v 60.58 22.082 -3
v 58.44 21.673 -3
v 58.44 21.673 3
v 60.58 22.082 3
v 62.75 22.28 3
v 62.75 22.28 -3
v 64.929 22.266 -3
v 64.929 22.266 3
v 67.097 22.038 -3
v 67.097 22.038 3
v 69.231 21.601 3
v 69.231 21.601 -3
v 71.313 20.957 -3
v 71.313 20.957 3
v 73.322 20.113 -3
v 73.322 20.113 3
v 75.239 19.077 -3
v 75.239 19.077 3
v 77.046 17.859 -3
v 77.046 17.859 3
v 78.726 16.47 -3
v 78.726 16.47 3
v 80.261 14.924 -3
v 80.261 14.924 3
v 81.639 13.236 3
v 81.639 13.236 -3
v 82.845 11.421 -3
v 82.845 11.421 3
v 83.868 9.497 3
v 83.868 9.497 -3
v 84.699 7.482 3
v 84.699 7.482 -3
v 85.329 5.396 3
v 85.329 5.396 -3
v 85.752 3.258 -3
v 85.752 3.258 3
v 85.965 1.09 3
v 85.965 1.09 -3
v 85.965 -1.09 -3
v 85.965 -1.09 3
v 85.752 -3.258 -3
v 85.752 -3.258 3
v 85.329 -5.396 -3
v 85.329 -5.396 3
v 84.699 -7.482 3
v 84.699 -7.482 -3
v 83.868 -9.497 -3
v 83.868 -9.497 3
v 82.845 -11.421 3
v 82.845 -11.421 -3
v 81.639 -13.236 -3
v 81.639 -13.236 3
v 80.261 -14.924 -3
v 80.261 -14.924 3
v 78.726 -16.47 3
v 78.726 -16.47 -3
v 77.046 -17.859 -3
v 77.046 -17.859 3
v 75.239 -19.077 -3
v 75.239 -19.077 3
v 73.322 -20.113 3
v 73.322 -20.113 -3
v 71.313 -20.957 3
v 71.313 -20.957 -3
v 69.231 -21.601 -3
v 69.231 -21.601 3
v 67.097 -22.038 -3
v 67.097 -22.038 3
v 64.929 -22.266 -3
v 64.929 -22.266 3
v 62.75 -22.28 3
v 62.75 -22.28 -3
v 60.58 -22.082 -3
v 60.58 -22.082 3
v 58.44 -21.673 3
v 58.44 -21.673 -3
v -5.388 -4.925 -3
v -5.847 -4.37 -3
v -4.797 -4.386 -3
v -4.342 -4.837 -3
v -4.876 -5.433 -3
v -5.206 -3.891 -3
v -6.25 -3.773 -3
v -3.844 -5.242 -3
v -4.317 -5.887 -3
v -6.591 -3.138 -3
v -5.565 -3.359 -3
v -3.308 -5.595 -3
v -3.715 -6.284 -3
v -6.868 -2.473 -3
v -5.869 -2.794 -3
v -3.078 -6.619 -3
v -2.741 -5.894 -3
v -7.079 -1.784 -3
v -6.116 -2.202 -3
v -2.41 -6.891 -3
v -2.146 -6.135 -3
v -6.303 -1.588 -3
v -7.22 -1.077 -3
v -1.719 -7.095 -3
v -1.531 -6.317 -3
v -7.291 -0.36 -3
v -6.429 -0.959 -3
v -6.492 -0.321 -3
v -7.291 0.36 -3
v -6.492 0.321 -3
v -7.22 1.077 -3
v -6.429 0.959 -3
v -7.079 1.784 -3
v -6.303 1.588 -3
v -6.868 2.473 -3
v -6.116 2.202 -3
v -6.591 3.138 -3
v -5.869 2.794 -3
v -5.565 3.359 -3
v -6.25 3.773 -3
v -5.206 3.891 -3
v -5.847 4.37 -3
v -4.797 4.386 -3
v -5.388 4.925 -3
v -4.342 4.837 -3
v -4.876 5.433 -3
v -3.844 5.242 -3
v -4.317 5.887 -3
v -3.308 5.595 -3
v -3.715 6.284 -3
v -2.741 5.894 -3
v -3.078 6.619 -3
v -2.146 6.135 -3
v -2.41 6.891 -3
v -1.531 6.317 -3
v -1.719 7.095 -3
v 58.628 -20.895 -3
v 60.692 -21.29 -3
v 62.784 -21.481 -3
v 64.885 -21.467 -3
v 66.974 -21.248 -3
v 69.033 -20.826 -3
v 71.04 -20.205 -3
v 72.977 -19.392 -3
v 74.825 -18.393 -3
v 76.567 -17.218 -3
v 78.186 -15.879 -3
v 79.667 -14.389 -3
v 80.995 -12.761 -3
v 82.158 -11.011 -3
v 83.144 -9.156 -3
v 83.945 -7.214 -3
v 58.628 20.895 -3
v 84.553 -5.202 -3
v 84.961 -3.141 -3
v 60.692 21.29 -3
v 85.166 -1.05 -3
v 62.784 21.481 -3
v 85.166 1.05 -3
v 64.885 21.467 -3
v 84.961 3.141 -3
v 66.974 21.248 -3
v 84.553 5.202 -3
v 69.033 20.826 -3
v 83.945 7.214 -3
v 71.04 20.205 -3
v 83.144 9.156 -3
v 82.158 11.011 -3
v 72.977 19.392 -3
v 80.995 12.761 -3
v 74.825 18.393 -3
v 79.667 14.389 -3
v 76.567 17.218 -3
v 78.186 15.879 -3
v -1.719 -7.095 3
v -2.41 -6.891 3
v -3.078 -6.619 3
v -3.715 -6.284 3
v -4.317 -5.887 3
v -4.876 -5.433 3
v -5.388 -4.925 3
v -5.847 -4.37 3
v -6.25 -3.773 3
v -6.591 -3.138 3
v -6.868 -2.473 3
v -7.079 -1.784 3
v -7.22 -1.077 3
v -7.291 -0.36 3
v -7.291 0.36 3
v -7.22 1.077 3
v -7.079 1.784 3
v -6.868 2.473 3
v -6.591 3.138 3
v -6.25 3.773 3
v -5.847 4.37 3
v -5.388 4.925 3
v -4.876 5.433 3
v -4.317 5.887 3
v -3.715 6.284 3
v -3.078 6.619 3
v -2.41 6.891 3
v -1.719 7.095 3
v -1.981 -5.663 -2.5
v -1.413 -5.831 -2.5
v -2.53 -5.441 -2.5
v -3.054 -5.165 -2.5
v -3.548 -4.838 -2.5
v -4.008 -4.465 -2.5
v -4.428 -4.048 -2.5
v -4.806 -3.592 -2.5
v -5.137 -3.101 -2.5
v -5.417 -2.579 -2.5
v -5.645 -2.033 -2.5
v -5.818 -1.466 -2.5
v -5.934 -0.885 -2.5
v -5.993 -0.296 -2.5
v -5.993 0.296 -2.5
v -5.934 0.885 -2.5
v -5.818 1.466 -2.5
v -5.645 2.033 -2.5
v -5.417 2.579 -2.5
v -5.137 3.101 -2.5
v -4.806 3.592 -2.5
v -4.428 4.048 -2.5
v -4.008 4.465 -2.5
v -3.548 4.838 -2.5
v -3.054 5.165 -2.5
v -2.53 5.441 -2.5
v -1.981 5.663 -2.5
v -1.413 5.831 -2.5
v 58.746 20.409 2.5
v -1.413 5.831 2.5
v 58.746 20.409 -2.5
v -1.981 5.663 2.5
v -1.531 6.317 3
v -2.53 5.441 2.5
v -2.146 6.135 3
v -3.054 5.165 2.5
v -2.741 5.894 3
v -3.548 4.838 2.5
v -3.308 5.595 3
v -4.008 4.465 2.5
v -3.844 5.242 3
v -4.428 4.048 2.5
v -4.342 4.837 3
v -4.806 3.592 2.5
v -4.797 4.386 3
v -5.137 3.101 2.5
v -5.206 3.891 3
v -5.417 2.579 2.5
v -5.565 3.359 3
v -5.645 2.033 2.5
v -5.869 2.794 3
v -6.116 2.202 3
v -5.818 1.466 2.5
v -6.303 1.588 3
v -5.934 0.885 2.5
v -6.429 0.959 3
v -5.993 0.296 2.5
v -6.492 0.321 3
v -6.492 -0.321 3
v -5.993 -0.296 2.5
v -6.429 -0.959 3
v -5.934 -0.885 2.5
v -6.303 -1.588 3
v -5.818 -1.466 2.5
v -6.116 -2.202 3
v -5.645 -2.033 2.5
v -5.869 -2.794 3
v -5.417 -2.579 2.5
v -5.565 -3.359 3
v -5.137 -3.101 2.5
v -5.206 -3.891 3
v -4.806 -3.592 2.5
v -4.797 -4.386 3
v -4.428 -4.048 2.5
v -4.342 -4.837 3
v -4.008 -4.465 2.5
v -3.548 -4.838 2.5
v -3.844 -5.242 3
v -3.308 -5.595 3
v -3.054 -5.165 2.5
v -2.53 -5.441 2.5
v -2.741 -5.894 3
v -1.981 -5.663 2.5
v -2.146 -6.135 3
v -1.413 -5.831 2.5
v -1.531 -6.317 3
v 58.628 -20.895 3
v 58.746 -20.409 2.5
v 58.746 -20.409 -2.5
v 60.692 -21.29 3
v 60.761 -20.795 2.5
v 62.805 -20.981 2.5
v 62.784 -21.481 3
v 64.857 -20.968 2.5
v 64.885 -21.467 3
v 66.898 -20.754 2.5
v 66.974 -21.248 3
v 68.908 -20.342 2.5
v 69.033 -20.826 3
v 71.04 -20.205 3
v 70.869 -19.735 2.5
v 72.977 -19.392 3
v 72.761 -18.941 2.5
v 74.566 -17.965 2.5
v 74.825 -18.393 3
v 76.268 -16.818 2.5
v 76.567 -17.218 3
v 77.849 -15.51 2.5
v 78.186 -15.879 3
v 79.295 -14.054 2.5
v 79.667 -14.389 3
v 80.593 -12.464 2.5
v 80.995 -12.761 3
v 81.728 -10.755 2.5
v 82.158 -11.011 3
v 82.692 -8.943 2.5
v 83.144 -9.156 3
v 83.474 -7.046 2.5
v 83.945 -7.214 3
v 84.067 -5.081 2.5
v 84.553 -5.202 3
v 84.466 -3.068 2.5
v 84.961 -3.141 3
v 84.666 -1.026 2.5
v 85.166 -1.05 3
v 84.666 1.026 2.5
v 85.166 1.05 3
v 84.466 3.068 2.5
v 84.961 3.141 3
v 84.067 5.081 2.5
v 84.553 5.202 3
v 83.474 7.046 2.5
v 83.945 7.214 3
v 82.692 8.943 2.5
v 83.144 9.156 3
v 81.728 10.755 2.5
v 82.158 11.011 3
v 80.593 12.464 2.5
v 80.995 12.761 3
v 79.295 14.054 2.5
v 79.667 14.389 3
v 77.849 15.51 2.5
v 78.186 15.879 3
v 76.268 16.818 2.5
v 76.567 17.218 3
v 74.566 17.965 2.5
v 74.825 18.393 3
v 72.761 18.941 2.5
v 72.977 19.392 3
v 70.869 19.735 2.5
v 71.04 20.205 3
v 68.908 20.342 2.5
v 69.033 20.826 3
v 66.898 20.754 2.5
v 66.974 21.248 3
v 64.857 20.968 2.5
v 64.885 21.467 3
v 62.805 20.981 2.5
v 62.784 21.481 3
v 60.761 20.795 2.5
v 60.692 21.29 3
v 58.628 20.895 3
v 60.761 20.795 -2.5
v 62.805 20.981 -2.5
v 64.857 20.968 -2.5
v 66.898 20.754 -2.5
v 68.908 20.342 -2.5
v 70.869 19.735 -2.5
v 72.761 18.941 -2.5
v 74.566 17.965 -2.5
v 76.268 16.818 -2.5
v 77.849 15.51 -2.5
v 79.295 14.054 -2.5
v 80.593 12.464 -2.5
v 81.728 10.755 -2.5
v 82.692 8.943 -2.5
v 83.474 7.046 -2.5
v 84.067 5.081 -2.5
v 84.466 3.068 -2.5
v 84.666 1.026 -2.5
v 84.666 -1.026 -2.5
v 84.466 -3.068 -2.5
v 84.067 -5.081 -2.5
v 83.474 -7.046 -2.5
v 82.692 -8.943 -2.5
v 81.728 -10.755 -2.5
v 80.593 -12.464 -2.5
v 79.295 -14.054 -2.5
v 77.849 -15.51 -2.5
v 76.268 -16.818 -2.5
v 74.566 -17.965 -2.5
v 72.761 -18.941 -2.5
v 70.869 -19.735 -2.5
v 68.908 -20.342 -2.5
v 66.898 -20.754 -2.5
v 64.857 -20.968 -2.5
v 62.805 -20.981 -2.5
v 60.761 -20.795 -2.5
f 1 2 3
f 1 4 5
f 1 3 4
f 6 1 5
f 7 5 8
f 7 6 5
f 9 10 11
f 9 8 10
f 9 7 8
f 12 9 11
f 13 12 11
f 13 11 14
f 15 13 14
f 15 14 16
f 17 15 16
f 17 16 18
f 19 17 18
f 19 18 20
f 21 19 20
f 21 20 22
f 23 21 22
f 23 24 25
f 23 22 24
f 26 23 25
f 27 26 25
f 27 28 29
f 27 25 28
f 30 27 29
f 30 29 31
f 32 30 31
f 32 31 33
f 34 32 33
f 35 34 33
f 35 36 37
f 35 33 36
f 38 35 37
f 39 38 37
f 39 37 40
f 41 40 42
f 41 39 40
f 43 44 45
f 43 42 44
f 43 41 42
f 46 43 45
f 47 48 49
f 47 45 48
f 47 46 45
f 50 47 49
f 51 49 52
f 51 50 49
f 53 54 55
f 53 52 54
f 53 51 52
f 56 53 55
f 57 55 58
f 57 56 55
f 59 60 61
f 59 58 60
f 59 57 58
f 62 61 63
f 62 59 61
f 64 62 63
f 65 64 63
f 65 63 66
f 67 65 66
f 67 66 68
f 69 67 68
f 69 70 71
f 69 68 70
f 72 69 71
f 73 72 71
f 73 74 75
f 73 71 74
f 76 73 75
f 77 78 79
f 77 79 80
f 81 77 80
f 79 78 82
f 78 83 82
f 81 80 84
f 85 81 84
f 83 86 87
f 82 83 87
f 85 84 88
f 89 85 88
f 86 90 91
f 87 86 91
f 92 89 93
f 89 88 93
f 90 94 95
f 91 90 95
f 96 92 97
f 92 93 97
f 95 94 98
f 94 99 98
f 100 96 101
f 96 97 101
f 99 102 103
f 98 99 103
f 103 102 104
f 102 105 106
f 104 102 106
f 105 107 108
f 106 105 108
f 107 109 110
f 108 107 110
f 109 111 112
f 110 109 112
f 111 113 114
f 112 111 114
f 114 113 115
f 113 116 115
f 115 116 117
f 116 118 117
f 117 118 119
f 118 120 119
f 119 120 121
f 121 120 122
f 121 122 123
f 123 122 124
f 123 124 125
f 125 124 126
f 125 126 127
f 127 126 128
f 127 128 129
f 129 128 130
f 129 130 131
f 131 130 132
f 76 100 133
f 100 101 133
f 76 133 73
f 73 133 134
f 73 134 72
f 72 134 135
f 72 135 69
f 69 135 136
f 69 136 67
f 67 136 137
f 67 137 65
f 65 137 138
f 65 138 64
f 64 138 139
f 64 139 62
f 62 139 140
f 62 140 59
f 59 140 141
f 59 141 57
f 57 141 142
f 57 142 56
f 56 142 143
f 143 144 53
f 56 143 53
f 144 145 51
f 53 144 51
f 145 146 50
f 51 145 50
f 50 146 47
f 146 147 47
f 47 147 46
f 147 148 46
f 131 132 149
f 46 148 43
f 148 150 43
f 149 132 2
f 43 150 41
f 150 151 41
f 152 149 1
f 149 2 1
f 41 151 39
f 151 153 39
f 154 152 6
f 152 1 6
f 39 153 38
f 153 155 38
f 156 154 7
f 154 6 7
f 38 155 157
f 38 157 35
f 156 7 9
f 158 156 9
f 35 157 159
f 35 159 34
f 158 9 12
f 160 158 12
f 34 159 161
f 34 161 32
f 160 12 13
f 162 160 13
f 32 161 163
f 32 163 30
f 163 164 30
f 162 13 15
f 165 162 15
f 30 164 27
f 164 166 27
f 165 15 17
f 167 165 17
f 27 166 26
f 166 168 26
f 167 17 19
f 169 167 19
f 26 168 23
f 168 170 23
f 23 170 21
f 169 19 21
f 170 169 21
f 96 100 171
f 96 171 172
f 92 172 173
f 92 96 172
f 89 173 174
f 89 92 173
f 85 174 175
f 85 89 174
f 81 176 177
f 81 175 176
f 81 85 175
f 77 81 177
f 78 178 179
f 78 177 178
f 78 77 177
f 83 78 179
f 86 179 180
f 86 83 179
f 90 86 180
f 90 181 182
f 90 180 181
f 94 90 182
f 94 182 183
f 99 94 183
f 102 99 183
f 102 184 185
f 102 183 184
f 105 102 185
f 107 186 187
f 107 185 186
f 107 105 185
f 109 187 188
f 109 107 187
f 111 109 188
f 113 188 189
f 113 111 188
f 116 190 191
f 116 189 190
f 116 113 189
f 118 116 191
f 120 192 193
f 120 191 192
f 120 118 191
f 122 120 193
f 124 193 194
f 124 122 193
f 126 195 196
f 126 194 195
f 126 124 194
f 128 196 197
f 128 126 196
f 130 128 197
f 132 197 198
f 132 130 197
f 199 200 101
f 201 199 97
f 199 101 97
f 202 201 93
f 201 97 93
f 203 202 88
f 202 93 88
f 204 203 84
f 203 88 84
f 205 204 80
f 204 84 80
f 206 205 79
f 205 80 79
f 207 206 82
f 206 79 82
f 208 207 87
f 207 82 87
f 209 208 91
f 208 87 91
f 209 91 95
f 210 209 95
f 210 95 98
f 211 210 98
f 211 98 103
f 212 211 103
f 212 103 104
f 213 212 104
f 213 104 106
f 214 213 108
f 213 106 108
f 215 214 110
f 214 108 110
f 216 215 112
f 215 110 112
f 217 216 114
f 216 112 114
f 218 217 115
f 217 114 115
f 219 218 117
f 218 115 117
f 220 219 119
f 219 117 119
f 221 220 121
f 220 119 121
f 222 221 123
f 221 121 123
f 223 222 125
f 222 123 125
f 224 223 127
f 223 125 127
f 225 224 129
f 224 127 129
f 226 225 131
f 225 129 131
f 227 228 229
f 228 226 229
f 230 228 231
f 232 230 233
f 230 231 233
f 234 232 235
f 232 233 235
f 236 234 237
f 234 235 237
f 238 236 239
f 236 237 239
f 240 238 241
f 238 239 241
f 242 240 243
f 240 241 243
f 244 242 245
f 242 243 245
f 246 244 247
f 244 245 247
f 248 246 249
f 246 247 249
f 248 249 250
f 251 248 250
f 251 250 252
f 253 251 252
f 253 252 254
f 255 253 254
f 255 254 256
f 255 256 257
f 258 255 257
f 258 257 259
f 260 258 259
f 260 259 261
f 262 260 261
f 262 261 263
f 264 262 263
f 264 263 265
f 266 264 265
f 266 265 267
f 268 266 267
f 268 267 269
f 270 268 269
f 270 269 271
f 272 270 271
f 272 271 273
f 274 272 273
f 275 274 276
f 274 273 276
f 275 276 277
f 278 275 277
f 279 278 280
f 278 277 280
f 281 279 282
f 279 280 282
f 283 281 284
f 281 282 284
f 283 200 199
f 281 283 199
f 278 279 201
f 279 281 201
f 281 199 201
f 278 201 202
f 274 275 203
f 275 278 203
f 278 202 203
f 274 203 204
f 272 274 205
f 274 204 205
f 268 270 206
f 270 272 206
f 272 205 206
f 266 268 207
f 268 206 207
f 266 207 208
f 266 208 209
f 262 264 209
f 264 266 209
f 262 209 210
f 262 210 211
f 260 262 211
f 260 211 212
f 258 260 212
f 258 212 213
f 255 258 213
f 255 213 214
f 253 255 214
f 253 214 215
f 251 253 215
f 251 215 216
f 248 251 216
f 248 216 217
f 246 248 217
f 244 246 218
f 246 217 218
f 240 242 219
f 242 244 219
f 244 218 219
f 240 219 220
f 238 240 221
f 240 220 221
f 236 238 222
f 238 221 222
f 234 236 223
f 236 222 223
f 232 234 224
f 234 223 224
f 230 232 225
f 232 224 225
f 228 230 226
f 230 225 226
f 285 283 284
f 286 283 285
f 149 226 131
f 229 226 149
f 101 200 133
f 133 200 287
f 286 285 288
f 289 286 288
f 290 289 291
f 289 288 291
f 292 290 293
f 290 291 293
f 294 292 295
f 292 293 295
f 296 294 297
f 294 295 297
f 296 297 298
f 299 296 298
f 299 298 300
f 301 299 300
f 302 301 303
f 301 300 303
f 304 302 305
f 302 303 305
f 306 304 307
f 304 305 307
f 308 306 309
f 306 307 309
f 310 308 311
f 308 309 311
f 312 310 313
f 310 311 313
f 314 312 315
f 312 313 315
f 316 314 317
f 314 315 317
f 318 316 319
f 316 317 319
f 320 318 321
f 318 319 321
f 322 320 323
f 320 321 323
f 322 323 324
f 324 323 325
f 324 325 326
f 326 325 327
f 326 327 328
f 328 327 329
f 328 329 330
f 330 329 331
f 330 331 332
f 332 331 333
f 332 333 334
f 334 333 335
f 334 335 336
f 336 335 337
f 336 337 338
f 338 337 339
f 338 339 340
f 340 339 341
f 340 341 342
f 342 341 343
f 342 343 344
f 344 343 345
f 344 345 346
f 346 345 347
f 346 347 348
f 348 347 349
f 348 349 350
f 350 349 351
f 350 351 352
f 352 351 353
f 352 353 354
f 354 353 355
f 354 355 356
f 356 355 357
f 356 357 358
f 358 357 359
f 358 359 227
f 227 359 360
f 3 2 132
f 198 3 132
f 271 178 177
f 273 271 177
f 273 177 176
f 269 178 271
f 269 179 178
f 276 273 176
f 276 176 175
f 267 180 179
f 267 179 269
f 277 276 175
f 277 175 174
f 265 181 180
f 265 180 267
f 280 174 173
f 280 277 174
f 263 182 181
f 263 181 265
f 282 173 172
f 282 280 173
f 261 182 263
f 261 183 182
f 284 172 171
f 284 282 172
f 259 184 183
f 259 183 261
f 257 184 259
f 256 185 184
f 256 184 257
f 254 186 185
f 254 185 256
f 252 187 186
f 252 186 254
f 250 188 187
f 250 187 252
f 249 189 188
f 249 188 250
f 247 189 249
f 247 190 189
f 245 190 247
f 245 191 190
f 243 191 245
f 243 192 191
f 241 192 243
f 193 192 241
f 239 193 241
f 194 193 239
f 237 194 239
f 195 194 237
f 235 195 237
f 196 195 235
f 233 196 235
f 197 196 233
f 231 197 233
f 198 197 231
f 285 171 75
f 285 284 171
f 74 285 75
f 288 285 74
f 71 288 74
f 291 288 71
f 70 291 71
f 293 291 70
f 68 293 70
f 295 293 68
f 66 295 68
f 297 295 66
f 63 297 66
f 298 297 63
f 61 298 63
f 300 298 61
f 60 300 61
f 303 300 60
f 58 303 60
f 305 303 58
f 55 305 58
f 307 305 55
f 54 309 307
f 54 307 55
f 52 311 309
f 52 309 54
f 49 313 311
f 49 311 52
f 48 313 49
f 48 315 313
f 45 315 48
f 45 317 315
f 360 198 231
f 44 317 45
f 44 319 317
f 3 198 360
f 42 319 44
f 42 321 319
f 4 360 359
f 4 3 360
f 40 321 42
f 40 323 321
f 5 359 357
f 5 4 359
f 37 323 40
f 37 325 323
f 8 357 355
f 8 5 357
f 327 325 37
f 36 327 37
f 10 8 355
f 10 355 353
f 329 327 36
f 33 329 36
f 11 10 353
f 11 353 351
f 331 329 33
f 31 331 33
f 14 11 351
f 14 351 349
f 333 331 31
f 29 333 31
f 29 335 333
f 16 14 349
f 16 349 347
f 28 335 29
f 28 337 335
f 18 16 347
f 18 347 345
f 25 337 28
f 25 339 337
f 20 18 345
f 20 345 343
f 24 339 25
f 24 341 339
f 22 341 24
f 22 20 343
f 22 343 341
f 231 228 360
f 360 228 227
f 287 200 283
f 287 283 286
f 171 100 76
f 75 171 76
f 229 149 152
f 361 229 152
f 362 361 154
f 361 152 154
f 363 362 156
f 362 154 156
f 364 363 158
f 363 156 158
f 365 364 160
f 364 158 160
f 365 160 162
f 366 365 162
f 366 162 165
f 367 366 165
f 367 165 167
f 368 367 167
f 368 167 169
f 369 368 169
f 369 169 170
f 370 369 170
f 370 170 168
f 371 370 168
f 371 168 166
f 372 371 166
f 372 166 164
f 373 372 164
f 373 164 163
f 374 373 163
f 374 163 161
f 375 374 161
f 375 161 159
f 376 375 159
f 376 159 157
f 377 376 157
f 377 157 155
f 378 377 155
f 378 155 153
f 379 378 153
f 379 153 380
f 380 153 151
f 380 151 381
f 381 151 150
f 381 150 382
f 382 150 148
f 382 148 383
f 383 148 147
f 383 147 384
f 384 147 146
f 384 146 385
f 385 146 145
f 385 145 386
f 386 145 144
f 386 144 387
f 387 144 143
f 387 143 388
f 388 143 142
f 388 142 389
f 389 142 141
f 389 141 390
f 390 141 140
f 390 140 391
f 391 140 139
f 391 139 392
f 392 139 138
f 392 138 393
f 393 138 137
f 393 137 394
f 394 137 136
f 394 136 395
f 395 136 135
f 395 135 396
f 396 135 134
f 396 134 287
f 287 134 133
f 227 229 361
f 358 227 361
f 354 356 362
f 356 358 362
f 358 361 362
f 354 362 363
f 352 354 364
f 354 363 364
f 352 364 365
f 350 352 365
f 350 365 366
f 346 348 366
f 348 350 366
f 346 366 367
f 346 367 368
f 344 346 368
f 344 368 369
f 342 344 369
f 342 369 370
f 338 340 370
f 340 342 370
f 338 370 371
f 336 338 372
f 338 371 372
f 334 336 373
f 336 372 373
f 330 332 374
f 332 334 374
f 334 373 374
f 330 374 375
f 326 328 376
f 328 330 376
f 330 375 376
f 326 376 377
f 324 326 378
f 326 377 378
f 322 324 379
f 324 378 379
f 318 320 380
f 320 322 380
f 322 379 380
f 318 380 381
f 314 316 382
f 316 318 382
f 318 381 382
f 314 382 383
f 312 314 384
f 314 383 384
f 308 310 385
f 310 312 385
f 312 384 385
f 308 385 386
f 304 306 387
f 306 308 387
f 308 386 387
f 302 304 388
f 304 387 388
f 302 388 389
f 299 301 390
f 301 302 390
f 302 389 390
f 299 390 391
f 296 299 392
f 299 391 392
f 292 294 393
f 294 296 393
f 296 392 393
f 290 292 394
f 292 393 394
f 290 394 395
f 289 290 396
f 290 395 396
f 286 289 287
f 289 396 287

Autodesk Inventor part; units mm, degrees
ref_plane "YZ Plane" through (0, 0, 0) normal (1, 0, 0) x (0, 1, 0)
ref_plane "XZ Plane" through (0, 0, 0) normal (0, 1, 0) x (-1, 0, 0)
ref_plane "XY Plane" through (0, 0, 0) normal (0, 0, 1) x (1, 0, 0)
sketch "Sketch1" plane through (0, 0, 0) normal (0, 0, 1) x (1, 0, 0)
  arc A0 (-1.4131, 5.8312) -> (-1.4131, -5.8312) centre (0, 0) ccw
  arc A1 (58.7458, -20.4093) -> (58.7458, 20.4093) centre (63.6915, 0) ccw
  line L0 (-1.4131, 5.8312) -> (58.7458, 20.4093)
  line L1 (-1.4131, -5.8312) -> (58.7458, -20.4093)
  line L2 (58.4396, 21.6727) -> (-1.7192, 7.0947)
  arc A2 (-1.7192, 7.0947) -> (-1.7192, -7.0947) centre (0, 0) ccw
  line L3 (-1.7192, -7.0947) -> (58.4396, -21.6727)
  arc A3 (58.4396, -21.6727) -> (58.4396, 21.6727) centre (63.6915, 0) ccw
  dimension "d0" = 12
  dimension "d1" = 42
  dimension "d2" = 61.9
  dimension "d3" = 1.3
extrude "Extrusion1" add sketch "Sketch1" along normal mid plane 6
chamfer "Chamfer1" distance 0.5 angle 45 8 edges at (-6, 0, 3) (28.6664, 13.1203, 3) (84.6915, 0, 3) (28.6664, -13.1203, 3) (-6, 0, -3) (28.6664, -13.1203, -3) (84.6915, 0, -3) (28.6664, 13.1203, -3)
properties part number "Tandriem20naar60T" material "Rubber"
